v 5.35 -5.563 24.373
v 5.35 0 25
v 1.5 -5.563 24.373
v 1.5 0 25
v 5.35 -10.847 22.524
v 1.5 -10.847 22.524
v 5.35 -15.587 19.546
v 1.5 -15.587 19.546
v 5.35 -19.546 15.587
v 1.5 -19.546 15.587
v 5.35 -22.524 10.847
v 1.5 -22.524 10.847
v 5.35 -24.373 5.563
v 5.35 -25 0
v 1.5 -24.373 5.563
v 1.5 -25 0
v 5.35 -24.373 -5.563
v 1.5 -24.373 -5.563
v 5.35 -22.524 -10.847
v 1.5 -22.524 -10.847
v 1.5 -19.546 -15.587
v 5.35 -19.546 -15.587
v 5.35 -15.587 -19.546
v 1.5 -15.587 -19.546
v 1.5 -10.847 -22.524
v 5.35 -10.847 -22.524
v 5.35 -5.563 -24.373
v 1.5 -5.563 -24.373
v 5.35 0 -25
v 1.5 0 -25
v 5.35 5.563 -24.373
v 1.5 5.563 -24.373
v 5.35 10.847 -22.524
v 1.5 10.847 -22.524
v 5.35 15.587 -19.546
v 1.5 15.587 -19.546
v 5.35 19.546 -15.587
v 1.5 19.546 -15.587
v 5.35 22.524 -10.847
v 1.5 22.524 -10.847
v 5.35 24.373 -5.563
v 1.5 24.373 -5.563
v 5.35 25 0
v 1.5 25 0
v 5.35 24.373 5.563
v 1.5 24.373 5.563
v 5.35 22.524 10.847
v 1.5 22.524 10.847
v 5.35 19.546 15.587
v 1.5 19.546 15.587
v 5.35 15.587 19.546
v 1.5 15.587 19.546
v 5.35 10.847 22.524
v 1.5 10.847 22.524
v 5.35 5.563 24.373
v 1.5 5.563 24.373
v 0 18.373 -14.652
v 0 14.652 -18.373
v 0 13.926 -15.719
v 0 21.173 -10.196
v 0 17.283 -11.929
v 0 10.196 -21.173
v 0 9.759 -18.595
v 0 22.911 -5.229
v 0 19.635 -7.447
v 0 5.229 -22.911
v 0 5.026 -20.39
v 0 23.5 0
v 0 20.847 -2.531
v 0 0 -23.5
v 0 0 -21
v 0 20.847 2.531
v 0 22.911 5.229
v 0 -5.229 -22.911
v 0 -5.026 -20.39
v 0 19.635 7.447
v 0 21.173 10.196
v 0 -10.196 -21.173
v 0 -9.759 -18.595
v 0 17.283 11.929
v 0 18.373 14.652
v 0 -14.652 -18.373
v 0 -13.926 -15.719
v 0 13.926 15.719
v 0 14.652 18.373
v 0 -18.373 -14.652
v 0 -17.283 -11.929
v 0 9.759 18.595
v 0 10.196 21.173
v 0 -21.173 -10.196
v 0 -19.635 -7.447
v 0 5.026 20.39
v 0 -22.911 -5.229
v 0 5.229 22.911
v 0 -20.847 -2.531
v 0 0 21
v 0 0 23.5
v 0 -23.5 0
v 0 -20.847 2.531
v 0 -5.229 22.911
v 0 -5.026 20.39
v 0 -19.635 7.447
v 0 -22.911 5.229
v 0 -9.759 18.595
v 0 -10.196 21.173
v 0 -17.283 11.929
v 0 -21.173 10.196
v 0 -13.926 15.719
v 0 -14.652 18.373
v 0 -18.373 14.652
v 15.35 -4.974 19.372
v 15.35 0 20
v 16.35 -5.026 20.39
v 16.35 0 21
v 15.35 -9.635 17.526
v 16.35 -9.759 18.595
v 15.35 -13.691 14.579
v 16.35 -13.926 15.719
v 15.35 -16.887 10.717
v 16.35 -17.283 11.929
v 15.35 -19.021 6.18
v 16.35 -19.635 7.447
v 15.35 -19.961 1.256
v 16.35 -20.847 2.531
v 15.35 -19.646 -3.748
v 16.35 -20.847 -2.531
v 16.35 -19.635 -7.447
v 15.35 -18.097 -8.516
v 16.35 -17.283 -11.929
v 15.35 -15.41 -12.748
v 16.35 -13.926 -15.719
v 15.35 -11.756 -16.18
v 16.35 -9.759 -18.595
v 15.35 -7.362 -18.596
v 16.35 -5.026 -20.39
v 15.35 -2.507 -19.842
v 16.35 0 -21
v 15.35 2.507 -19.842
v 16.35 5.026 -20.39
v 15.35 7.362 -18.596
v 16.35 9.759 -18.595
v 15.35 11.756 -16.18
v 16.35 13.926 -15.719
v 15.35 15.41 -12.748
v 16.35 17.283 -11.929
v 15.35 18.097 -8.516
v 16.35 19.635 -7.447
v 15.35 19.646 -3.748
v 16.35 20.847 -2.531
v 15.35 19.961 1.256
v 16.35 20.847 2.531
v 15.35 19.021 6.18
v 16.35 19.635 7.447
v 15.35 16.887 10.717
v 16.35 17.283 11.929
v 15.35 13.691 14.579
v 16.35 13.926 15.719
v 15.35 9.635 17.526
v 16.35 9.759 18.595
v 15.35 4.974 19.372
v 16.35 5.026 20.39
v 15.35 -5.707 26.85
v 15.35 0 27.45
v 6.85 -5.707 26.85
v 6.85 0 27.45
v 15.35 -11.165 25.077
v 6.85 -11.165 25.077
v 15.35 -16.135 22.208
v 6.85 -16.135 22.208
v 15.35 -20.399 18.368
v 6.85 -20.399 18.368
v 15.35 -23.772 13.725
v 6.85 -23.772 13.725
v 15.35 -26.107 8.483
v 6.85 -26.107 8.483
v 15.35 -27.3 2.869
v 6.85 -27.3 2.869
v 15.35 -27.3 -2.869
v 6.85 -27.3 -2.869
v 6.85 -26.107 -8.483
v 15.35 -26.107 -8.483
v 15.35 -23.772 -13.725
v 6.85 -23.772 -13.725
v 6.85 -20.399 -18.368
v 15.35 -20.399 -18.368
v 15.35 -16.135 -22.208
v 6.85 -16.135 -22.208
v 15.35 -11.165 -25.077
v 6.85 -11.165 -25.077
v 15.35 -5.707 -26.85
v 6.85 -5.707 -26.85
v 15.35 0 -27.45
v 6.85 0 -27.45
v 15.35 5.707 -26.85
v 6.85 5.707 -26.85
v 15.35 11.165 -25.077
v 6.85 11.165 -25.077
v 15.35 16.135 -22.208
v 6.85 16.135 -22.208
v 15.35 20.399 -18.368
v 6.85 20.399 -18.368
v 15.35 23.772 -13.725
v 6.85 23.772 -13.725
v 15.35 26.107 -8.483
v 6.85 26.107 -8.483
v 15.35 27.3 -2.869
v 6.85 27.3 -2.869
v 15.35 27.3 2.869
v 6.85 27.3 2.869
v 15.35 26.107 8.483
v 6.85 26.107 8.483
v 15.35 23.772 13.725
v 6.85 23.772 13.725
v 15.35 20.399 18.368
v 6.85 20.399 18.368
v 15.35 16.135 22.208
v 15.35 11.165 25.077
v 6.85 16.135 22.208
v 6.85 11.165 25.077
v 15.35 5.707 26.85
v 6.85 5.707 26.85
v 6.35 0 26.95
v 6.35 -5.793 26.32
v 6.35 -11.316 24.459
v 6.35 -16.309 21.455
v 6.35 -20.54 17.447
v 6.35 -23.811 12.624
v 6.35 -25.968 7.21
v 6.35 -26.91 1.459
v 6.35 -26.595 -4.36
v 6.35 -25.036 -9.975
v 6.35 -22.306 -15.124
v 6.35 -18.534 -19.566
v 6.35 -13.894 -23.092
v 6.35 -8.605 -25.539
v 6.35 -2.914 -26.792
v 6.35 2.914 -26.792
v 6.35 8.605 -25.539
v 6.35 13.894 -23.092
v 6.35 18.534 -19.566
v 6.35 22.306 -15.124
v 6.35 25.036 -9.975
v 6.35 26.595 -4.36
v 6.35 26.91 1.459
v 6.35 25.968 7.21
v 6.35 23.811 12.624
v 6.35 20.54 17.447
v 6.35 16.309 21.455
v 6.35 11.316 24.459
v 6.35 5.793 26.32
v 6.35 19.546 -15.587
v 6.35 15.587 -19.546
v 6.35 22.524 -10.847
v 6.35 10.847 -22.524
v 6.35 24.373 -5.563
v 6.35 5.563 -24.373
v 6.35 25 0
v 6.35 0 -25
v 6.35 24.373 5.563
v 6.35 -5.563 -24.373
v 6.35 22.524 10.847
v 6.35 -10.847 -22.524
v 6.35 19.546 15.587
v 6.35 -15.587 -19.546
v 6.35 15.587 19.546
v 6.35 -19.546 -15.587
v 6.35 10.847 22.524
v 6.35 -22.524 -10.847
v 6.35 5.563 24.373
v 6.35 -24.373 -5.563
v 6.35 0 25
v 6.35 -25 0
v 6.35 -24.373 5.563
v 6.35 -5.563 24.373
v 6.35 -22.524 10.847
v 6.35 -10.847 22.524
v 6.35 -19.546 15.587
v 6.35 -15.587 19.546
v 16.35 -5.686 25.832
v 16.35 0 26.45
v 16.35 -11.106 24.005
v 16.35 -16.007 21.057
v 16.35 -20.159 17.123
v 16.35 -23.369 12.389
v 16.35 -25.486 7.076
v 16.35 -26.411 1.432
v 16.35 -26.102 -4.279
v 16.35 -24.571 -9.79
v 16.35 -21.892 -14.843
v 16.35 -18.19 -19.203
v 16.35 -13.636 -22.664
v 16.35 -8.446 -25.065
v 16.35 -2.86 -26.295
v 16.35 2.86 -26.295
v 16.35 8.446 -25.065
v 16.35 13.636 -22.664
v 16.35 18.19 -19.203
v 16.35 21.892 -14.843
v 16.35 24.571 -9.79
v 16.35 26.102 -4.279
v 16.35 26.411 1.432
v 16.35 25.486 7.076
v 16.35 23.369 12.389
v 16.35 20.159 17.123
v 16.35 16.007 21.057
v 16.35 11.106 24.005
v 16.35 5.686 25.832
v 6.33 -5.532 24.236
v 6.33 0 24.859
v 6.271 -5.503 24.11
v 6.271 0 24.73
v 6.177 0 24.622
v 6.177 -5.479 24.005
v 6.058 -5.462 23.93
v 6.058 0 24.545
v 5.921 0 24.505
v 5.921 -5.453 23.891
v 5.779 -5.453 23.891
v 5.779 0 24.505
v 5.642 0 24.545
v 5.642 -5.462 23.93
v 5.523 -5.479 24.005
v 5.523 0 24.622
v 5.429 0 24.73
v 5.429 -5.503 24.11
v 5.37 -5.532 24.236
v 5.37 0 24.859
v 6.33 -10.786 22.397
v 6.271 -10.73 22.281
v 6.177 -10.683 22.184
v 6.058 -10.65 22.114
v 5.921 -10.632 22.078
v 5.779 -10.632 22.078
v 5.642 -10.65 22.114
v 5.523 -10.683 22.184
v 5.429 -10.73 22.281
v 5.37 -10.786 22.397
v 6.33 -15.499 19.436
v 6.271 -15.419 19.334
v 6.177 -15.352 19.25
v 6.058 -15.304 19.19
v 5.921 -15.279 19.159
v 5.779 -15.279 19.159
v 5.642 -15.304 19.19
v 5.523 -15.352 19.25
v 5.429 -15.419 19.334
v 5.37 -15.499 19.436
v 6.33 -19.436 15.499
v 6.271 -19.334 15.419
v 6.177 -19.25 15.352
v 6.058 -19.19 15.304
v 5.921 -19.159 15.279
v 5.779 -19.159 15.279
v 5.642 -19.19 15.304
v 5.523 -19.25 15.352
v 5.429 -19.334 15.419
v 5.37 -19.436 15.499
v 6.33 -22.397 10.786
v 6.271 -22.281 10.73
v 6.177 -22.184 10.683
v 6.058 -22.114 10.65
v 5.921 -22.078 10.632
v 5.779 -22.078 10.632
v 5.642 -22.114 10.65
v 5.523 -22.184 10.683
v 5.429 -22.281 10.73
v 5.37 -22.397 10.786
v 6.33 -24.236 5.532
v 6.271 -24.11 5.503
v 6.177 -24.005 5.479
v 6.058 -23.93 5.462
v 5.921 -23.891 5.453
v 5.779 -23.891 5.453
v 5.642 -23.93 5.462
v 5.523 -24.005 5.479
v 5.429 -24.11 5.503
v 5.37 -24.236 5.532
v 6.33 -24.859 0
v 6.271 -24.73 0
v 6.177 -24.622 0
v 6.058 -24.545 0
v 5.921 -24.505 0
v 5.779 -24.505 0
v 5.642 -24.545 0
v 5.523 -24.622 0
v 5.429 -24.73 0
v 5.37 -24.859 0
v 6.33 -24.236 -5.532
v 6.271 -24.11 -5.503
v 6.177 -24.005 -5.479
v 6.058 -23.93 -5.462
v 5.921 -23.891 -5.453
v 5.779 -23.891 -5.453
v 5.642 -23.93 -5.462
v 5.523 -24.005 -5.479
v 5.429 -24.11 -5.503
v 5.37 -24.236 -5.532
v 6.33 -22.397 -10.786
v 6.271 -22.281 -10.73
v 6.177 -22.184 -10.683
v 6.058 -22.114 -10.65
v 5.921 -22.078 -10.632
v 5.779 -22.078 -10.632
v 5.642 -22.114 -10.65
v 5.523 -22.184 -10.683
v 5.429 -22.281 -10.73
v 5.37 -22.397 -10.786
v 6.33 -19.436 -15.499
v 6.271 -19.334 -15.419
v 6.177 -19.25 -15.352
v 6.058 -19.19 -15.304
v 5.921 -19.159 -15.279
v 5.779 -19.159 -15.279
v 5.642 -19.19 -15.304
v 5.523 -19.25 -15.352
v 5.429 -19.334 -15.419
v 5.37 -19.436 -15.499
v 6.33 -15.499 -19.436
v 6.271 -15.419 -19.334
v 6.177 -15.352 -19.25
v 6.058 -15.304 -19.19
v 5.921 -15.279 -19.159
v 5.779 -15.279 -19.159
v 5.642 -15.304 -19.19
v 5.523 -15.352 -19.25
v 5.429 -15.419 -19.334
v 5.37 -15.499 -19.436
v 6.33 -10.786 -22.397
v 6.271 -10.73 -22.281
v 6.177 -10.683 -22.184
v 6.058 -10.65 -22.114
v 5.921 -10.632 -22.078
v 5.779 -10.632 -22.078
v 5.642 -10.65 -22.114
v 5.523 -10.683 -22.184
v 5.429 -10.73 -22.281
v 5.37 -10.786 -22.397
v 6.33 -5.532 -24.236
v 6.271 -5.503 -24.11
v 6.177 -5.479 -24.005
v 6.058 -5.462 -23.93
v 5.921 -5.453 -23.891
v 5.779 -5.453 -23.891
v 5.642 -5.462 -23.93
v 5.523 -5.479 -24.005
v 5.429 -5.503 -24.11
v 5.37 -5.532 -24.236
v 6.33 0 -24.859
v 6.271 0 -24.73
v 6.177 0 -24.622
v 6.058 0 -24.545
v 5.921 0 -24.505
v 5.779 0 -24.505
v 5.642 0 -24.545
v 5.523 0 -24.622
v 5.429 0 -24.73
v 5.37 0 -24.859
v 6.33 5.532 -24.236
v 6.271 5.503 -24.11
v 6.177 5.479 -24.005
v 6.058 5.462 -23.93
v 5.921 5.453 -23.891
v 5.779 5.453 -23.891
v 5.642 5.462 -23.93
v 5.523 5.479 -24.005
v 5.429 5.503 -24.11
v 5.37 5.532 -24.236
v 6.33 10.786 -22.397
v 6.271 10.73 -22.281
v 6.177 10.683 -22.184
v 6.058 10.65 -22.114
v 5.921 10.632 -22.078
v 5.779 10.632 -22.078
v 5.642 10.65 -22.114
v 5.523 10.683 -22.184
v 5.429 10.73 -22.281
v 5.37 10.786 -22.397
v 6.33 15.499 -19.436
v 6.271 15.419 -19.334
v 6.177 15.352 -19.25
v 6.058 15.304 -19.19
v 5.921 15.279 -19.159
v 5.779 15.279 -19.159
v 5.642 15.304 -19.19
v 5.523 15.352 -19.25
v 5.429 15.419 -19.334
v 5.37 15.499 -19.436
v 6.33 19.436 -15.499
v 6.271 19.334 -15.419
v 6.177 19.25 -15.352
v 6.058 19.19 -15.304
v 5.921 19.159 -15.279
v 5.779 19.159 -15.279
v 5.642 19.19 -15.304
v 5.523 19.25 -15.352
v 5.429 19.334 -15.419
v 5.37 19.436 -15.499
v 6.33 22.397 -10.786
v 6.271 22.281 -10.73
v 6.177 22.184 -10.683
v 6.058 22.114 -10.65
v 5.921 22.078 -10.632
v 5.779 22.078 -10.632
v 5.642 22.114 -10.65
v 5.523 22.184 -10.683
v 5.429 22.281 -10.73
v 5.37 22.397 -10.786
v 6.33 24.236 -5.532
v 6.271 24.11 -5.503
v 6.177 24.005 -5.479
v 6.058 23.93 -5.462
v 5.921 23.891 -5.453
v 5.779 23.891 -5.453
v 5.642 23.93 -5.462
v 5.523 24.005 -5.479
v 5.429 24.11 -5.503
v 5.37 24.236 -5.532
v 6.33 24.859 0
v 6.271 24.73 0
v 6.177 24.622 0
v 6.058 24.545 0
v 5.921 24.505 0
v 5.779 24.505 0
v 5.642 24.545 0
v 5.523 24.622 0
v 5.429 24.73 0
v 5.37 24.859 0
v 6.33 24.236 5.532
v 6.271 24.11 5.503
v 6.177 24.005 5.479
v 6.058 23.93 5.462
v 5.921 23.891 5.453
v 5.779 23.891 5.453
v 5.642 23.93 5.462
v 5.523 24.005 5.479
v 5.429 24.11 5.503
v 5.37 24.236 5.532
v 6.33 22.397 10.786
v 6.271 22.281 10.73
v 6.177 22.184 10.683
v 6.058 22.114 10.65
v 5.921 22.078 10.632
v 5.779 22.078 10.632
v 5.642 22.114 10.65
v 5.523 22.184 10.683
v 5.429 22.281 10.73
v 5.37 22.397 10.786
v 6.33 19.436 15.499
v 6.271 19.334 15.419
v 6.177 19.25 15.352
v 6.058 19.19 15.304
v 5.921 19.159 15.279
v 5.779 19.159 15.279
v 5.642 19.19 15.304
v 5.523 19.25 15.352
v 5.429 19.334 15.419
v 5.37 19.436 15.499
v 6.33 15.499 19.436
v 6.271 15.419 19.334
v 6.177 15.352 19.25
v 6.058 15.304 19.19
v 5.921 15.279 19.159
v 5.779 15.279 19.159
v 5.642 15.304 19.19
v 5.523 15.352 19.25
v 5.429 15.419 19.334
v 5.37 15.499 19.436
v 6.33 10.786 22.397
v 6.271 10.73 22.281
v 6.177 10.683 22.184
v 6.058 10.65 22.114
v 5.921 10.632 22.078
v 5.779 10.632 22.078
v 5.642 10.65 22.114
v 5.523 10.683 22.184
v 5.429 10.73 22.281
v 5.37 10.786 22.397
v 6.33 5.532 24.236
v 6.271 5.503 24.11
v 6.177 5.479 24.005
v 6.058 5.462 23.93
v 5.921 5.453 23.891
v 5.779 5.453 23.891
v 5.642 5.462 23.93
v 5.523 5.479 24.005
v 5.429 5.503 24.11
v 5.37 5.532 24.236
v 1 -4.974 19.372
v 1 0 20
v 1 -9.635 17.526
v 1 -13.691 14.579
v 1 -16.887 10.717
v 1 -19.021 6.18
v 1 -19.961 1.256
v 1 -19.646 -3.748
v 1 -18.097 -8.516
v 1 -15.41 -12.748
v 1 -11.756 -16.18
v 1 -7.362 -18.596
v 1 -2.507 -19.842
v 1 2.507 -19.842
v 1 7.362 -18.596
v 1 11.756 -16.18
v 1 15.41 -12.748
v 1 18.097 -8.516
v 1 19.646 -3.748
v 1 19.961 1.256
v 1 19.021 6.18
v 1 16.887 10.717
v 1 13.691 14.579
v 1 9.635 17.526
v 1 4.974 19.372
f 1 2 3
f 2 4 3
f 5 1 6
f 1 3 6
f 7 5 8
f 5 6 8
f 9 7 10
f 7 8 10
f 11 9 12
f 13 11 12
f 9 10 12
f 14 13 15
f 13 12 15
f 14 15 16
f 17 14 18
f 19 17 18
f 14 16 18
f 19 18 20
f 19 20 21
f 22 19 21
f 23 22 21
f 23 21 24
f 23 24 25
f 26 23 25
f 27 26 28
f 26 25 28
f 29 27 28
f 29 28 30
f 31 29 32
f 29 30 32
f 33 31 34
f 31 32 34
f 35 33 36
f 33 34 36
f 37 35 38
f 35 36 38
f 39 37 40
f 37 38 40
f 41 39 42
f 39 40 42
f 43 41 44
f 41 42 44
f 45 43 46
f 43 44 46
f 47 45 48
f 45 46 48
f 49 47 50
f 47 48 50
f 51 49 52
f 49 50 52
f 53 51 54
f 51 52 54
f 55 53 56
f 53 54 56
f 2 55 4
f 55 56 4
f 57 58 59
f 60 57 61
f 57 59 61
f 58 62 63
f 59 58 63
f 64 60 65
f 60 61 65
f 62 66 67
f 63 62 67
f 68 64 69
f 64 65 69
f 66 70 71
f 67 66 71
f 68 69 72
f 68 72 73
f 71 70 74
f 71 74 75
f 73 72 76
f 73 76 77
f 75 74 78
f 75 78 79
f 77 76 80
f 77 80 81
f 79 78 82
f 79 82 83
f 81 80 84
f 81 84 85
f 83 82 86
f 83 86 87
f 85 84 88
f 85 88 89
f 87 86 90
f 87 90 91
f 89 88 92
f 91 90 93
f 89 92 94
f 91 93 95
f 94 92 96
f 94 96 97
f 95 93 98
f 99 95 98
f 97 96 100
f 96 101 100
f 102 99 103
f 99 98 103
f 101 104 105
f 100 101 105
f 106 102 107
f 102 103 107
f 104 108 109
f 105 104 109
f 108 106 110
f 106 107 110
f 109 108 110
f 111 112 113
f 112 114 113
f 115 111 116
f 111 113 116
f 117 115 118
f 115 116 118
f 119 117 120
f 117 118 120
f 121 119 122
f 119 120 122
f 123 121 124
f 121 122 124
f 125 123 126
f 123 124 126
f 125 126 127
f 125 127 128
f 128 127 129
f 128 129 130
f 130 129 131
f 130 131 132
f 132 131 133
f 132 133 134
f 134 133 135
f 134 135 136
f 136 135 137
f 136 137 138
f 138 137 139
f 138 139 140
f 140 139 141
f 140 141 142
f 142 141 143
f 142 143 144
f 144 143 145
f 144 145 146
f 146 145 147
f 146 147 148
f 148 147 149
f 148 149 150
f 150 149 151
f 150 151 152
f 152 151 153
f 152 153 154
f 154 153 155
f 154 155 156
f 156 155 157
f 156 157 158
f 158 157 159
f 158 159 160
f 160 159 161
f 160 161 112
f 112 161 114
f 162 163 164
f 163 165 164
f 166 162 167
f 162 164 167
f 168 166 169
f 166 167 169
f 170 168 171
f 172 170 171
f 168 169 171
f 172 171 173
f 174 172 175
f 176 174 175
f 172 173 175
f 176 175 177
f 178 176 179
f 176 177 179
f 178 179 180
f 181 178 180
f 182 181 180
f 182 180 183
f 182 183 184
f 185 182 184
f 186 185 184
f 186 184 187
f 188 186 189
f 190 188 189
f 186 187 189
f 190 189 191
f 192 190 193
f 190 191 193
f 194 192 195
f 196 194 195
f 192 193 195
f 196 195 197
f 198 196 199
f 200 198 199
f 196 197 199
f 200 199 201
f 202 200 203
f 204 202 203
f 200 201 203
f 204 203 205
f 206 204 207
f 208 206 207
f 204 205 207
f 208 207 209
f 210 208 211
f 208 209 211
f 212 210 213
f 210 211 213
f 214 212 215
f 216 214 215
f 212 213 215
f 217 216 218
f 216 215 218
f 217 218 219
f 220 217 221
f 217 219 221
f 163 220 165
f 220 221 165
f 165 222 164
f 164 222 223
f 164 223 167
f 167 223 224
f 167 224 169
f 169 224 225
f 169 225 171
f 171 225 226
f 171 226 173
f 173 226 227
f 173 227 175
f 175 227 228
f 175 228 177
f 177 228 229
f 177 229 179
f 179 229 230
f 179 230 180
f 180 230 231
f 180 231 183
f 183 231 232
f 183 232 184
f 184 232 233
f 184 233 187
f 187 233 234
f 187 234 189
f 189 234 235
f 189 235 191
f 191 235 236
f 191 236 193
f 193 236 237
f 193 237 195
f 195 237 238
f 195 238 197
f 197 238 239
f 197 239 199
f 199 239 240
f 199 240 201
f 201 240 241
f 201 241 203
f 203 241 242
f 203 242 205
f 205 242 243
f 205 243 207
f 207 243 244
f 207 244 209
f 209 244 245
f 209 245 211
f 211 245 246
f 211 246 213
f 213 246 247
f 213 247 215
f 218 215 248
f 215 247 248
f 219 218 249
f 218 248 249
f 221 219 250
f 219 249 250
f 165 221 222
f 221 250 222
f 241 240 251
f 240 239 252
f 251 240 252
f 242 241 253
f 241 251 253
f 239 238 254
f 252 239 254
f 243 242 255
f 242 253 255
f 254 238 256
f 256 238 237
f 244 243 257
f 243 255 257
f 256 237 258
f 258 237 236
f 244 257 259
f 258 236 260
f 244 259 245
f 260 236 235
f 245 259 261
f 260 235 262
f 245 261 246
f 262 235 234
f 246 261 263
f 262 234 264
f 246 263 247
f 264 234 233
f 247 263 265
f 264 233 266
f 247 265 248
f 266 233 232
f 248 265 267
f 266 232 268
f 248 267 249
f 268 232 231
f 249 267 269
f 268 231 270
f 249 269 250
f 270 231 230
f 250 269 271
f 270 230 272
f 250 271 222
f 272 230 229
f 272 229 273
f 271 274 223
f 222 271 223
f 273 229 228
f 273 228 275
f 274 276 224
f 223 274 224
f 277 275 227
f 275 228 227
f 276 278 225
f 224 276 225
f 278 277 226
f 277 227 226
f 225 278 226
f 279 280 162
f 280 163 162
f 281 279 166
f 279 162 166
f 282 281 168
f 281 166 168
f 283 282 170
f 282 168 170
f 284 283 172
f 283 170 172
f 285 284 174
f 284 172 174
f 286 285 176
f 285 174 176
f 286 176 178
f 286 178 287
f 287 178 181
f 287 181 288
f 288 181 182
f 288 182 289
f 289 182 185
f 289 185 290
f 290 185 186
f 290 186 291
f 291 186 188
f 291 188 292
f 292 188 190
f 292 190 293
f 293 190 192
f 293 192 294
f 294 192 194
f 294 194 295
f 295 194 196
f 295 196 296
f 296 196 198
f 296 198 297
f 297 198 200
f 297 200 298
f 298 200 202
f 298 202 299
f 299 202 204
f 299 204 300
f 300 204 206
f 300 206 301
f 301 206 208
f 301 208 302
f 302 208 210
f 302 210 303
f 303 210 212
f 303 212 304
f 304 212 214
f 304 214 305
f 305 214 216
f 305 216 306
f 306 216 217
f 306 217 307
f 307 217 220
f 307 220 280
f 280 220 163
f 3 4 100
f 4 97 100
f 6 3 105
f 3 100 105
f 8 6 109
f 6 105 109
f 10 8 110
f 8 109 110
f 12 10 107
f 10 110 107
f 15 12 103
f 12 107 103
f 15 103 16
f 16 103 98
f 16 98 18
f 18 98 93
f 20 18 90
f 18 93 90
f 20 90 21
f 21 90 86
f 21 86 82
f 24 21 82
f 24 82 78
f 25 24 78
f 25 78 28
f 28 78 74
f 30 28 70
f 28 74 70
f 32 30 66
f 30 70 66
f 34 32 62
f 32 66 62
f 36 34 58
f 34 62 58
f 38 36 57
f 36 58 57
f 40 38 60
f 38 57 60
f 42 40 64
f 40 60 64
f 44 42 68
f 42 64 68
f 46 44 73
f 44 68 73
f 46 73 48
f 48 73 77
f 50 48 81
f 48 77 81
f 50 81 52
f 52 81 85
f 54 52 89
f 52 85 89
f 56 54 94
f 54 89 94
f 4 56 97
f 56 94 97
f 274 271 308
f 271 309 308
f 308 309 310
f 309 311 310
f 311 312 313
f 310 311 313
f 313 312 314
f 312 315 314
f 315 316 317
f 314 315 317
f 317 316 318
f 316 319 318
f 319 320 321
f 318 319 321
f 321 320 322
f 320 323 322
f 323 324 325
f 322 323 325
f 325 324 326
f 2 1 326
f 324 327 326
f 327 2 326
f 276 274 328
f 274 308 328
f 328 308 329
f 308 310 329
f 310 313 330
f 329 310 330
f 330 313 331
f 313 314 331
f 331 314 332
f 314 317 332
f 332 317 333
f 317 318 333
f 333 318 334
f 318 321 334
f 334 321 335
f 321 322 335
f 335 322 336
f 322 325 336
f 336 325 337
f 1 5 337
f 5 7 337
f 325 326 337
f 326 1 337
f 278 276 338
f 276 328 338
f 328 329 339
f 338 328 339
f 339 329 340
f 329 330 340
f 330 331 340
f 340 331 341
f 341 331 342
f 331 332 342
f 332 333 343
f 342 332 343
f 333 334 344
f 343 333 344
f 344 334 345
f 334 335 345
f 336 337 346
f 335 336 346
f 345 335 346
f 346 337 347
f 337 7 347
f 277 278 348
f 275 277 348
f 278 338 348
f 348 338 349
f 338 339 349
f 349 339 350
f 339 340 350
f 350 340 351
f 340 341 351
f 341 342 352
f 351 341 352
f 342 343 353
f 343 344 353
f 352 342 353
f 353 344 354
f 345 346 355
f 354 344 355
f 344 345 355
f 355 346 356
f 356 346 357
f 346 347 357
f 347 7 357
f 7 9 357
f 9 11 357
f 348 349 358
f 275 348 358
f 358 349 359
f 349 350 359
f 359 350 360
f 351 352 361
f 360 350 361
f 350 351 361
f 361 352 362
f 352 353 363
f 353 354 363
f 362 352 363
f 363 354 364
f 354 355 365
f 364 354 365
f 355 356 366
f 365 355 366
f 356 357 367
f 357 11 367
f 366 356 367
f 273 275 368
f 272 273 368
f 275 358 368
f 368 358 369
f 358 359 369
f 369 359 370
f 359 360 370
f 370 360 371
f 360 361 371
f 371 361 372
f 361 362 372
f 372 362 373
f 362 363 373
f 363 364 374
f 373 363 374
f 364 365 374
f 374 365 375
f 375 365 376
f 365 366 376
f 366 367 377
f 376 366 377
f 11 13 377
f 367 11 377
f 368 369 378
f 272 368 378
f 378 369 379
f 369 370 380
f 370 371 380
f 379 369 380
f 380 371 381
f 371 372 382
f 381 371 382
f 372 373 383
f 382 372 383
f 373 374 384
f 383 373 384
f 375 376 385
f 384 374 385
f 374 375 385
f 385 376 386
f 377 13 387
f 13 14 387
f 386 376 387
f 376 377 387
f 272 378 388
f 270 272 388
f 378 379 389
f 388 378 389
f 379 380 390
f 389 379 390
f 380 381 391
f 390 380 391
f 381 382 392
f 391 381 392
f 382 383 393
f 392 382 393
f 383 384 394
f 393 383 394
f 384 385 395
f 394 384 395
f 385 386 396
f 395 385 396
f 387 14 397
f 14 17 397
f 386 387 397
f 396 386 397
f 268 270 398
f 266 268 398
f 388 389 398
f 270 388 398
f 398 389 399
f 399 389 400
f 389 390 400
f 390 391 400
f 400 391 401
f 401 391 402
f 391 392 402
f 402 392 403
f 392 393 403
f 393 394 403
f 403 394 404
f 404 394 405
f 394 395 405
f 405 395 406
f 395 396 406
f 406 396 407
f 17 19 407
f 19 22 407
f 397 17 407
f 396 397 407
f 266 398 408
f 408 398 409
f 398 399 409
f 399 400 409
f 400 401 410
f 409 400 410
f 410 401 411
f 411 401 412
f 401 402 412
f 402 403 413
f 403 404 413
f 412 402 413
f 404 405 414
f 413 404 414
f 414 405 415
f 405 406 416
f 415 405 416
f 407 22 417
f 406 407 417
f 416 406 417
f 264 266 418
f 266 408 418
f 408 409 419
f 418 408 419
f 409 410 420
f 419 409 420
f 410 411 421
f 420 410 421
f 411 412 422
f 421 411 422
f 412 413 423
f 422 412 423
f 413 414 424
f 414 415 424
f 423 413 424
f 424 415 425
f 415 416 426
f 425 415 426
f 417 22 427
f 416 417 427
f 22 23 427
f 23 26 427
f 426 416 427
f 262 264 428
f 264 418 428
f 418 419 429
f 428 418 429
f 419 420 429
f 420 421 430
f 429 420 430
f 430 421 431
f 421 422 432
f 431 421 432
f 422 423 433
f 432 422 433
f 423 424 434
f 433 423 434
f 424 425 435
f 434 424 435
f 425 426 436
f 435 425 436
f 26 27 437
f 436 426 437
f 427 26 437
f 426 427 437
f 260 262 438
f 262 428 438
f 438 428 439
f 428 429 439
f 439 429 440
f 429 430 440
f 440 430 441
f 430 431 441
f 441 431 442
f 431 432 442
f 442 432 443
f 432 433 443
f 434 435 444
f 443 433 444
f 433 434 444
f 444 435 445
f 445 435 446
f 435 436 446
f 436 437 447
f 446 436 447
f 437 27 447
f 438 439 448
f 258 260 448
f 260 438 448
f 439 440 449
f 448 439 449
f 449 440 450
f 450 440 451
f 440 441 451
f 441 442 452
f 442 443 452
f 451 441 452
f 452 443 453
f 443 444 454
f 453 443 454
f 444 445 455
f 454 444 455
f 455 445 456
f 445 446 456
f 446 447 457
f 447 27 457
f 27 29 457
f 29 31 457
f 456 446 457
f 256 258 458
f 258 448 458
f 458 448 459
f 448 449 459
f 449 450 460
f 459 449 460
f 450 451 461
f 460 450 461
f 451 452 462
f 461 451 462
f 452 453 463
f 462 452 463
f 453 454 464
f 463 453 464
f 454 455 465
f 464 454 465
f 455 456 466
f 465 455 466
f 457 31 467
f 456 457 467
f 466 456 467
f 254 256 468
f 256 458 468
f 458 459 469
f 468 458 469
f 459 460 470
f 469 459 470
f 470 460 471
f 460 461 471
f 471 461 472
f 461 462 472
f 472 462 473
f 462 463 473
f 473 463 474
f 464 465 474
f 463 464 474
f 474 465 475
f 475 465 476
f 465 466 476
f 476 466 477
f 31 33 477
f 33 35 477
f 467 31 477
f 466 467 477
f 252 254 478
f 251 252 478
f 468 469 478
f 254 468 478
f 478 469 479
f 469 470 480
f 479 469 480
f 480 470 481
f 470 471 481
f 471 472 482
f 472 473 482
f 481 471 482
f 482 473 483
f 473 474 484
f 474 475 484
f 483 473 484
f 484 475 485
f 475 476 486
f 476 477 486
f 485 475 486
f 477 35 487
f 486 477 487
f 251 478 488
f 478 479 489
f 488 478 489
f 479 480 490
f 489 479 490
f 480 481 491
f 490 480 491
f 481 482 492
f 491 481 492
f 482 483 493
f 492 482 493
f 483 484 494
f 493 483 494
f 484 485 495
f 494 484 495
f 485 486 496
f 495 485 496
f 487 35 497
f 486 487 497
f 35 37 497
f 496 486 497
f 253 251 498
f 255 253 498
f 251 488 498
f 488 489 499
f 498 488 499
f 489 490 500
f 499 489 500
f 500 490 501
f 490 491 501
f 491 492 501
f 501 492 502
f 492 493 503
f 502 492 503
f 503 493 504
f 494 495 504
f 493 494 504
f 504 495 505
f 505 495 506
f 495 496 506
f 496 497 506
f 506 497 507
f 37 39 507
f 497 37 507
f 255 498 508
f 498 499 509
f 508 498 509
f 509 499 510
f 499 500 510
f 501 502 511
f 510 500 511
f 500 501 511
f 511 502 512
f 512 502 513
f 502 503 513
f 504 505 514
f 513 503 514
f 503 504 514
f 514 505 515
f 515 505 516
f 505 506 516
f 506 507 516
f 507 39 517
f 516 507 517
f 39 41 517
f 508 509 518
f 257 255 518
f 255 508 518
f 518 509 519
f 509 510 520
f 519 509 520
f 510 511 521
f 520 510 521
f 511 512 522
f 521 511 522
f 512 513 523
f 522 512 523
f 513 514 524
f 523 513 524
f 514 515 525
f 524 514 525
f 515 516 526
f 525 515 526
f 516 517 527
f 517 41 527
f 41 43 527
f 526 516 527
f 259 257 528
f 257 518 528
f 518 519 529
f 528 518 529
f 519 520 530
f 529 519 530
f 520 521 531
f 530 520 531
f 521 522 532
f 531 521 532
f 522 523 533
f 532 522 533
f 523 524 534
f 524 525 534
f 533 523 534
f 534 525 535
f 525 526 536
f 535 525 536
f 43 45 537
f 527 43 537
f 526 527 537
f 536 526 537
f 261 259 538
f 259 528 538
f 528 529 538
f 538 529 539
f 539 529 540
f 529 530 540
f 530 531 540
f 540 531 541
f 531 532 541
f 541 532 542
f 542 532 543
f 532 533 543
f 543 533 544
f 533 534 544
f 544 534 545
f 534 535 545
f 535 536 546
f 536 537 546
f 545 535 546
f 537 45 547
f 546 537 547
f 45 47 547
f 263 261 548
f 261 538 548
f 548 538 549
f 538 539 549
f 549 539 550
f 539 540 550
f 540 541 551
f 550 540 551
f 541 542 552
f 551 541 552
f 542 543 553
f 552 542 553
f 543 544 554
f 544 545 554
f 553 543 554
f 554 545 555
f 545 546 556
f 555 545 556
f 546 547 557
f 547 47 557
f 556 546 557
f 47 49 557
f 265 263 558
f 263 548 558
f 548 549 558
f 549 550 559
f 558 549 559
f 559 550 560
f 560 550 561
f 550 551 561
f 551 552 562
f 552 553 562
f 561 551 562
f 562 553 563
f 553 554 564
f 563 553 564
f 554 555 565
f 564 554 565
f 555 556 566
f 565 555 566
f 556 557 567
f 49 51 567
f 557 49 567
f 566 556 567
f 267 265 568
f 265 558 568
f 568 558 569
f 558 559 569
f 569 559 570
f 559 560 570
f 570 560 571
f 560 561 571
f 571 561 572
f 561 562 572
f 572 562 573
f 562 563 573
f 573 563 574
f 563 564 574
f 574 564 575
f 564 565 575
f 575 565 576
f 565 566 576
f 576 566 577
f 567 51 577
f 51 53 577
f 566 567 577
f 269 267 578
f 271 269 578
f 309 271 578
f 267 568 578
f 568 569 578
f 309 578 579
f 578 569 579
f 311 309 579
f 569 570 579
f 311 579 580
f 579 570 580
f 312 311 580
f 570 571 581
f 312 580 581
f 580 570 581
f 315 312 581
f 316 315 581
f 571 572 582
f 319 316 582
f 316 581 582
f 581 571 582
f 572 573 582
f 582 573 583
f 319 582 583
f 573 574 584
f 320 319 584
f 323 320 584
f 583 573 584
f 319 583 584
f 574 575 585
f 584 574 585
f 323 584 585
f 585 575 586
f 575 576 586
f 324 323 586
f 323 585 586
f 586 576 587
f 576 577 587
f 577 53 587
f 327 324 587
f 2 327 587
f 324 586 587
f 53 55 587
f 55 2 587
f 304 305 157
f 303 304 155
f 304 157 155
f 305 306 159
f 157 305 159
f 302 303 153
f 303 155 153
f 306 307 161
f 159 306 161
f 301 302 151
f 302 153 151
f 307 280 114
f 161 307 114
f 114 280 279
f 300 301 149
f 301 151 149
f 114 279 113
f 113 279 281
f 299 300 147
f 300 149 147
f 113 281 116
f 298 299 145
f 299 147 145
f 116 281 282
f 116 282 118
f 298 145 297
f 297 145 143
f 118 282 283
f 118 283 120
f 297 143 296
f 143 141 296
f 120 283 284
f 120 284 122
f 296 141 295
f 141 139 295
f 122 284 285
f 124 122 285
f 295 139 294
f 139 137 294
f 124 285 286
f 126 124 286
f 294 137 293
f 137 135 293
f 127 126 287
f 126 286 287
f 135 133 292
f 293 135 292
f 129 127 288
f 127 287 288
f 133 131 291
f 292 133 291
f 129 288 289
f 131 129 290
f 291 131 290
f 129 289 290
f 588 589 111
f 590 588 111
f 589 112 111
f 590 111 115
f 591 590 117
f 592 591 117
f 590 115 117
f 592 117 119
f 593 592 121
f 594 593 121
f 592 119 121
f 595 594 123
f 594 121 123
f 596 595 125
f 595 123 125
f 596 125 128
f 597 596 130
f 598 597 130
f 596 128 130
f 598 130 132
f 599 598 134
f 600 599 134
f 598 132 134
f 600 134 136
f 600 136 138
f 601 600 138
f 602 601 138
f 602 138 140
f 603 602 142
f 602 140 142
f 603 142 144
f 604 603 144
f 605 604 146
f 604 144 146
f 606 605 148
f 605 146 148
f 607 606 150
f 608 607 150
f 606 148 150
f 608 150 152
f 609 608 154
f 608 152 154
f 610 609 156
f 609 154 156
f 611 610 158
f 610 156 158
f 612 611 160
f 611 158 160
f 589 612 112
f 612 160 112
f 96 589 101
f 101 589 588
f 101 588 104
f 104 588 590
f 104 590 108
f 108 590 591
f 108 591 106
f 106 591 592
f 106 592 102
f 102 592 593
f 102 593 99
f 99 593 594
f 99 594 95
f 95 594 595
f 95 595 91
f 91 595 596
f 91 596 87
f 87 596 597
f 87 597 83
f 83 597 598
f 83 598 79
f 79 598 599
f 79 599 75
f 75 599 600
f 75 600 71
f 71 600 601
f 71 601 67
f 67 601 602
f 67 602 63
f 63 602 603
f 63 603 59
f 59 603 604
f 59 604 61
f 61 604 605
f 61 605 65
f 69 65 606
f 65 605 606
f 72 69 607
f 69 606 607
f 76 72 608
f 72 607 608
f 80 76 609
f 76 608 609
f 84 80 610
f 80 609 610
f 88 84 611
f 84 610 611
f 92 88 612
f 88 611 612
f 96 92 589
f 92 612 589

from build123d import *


with BuildPart() as part:
    # Croquis2 → Revolución1 (revolve)
    with BuildSketch(Plane.XY, mode=Mode.PRIVATE) as revoluci_n1_sk:
        with BuildLine():
            Line((0, 23.5), (0, 21))
            Line((0, 21), (1, 20))
            Line((1, 20), (15.35, 20))
            Line((15.35, 20), (16.35, 21))
            Line((16.35, 21), (16.35, 26.45))
            Line((16.35, 26.45), (15.35, 27.45))
            Line((15.35, 27.45), (6.85, 27.45))
            Line((6.85, 27.45), (6.35, 26.95))
            Line((6.35, 26.95), (6.35, 25))
            ThreePointArc((6.35, 25), (5.85, 24.5), (5.35, 25))
            Line((5.35, 25), (1.5, 25))
            Line((1.5, 25), (0, 23.5))
        make_face()
    revolve(revoluci_n1_sk.sketch.rotate(Axis((0, 0, 0), (1, 0, 0)), 90), axis=Axis((0, 0, 0), (1, 0, 0)))


solid = part.part
